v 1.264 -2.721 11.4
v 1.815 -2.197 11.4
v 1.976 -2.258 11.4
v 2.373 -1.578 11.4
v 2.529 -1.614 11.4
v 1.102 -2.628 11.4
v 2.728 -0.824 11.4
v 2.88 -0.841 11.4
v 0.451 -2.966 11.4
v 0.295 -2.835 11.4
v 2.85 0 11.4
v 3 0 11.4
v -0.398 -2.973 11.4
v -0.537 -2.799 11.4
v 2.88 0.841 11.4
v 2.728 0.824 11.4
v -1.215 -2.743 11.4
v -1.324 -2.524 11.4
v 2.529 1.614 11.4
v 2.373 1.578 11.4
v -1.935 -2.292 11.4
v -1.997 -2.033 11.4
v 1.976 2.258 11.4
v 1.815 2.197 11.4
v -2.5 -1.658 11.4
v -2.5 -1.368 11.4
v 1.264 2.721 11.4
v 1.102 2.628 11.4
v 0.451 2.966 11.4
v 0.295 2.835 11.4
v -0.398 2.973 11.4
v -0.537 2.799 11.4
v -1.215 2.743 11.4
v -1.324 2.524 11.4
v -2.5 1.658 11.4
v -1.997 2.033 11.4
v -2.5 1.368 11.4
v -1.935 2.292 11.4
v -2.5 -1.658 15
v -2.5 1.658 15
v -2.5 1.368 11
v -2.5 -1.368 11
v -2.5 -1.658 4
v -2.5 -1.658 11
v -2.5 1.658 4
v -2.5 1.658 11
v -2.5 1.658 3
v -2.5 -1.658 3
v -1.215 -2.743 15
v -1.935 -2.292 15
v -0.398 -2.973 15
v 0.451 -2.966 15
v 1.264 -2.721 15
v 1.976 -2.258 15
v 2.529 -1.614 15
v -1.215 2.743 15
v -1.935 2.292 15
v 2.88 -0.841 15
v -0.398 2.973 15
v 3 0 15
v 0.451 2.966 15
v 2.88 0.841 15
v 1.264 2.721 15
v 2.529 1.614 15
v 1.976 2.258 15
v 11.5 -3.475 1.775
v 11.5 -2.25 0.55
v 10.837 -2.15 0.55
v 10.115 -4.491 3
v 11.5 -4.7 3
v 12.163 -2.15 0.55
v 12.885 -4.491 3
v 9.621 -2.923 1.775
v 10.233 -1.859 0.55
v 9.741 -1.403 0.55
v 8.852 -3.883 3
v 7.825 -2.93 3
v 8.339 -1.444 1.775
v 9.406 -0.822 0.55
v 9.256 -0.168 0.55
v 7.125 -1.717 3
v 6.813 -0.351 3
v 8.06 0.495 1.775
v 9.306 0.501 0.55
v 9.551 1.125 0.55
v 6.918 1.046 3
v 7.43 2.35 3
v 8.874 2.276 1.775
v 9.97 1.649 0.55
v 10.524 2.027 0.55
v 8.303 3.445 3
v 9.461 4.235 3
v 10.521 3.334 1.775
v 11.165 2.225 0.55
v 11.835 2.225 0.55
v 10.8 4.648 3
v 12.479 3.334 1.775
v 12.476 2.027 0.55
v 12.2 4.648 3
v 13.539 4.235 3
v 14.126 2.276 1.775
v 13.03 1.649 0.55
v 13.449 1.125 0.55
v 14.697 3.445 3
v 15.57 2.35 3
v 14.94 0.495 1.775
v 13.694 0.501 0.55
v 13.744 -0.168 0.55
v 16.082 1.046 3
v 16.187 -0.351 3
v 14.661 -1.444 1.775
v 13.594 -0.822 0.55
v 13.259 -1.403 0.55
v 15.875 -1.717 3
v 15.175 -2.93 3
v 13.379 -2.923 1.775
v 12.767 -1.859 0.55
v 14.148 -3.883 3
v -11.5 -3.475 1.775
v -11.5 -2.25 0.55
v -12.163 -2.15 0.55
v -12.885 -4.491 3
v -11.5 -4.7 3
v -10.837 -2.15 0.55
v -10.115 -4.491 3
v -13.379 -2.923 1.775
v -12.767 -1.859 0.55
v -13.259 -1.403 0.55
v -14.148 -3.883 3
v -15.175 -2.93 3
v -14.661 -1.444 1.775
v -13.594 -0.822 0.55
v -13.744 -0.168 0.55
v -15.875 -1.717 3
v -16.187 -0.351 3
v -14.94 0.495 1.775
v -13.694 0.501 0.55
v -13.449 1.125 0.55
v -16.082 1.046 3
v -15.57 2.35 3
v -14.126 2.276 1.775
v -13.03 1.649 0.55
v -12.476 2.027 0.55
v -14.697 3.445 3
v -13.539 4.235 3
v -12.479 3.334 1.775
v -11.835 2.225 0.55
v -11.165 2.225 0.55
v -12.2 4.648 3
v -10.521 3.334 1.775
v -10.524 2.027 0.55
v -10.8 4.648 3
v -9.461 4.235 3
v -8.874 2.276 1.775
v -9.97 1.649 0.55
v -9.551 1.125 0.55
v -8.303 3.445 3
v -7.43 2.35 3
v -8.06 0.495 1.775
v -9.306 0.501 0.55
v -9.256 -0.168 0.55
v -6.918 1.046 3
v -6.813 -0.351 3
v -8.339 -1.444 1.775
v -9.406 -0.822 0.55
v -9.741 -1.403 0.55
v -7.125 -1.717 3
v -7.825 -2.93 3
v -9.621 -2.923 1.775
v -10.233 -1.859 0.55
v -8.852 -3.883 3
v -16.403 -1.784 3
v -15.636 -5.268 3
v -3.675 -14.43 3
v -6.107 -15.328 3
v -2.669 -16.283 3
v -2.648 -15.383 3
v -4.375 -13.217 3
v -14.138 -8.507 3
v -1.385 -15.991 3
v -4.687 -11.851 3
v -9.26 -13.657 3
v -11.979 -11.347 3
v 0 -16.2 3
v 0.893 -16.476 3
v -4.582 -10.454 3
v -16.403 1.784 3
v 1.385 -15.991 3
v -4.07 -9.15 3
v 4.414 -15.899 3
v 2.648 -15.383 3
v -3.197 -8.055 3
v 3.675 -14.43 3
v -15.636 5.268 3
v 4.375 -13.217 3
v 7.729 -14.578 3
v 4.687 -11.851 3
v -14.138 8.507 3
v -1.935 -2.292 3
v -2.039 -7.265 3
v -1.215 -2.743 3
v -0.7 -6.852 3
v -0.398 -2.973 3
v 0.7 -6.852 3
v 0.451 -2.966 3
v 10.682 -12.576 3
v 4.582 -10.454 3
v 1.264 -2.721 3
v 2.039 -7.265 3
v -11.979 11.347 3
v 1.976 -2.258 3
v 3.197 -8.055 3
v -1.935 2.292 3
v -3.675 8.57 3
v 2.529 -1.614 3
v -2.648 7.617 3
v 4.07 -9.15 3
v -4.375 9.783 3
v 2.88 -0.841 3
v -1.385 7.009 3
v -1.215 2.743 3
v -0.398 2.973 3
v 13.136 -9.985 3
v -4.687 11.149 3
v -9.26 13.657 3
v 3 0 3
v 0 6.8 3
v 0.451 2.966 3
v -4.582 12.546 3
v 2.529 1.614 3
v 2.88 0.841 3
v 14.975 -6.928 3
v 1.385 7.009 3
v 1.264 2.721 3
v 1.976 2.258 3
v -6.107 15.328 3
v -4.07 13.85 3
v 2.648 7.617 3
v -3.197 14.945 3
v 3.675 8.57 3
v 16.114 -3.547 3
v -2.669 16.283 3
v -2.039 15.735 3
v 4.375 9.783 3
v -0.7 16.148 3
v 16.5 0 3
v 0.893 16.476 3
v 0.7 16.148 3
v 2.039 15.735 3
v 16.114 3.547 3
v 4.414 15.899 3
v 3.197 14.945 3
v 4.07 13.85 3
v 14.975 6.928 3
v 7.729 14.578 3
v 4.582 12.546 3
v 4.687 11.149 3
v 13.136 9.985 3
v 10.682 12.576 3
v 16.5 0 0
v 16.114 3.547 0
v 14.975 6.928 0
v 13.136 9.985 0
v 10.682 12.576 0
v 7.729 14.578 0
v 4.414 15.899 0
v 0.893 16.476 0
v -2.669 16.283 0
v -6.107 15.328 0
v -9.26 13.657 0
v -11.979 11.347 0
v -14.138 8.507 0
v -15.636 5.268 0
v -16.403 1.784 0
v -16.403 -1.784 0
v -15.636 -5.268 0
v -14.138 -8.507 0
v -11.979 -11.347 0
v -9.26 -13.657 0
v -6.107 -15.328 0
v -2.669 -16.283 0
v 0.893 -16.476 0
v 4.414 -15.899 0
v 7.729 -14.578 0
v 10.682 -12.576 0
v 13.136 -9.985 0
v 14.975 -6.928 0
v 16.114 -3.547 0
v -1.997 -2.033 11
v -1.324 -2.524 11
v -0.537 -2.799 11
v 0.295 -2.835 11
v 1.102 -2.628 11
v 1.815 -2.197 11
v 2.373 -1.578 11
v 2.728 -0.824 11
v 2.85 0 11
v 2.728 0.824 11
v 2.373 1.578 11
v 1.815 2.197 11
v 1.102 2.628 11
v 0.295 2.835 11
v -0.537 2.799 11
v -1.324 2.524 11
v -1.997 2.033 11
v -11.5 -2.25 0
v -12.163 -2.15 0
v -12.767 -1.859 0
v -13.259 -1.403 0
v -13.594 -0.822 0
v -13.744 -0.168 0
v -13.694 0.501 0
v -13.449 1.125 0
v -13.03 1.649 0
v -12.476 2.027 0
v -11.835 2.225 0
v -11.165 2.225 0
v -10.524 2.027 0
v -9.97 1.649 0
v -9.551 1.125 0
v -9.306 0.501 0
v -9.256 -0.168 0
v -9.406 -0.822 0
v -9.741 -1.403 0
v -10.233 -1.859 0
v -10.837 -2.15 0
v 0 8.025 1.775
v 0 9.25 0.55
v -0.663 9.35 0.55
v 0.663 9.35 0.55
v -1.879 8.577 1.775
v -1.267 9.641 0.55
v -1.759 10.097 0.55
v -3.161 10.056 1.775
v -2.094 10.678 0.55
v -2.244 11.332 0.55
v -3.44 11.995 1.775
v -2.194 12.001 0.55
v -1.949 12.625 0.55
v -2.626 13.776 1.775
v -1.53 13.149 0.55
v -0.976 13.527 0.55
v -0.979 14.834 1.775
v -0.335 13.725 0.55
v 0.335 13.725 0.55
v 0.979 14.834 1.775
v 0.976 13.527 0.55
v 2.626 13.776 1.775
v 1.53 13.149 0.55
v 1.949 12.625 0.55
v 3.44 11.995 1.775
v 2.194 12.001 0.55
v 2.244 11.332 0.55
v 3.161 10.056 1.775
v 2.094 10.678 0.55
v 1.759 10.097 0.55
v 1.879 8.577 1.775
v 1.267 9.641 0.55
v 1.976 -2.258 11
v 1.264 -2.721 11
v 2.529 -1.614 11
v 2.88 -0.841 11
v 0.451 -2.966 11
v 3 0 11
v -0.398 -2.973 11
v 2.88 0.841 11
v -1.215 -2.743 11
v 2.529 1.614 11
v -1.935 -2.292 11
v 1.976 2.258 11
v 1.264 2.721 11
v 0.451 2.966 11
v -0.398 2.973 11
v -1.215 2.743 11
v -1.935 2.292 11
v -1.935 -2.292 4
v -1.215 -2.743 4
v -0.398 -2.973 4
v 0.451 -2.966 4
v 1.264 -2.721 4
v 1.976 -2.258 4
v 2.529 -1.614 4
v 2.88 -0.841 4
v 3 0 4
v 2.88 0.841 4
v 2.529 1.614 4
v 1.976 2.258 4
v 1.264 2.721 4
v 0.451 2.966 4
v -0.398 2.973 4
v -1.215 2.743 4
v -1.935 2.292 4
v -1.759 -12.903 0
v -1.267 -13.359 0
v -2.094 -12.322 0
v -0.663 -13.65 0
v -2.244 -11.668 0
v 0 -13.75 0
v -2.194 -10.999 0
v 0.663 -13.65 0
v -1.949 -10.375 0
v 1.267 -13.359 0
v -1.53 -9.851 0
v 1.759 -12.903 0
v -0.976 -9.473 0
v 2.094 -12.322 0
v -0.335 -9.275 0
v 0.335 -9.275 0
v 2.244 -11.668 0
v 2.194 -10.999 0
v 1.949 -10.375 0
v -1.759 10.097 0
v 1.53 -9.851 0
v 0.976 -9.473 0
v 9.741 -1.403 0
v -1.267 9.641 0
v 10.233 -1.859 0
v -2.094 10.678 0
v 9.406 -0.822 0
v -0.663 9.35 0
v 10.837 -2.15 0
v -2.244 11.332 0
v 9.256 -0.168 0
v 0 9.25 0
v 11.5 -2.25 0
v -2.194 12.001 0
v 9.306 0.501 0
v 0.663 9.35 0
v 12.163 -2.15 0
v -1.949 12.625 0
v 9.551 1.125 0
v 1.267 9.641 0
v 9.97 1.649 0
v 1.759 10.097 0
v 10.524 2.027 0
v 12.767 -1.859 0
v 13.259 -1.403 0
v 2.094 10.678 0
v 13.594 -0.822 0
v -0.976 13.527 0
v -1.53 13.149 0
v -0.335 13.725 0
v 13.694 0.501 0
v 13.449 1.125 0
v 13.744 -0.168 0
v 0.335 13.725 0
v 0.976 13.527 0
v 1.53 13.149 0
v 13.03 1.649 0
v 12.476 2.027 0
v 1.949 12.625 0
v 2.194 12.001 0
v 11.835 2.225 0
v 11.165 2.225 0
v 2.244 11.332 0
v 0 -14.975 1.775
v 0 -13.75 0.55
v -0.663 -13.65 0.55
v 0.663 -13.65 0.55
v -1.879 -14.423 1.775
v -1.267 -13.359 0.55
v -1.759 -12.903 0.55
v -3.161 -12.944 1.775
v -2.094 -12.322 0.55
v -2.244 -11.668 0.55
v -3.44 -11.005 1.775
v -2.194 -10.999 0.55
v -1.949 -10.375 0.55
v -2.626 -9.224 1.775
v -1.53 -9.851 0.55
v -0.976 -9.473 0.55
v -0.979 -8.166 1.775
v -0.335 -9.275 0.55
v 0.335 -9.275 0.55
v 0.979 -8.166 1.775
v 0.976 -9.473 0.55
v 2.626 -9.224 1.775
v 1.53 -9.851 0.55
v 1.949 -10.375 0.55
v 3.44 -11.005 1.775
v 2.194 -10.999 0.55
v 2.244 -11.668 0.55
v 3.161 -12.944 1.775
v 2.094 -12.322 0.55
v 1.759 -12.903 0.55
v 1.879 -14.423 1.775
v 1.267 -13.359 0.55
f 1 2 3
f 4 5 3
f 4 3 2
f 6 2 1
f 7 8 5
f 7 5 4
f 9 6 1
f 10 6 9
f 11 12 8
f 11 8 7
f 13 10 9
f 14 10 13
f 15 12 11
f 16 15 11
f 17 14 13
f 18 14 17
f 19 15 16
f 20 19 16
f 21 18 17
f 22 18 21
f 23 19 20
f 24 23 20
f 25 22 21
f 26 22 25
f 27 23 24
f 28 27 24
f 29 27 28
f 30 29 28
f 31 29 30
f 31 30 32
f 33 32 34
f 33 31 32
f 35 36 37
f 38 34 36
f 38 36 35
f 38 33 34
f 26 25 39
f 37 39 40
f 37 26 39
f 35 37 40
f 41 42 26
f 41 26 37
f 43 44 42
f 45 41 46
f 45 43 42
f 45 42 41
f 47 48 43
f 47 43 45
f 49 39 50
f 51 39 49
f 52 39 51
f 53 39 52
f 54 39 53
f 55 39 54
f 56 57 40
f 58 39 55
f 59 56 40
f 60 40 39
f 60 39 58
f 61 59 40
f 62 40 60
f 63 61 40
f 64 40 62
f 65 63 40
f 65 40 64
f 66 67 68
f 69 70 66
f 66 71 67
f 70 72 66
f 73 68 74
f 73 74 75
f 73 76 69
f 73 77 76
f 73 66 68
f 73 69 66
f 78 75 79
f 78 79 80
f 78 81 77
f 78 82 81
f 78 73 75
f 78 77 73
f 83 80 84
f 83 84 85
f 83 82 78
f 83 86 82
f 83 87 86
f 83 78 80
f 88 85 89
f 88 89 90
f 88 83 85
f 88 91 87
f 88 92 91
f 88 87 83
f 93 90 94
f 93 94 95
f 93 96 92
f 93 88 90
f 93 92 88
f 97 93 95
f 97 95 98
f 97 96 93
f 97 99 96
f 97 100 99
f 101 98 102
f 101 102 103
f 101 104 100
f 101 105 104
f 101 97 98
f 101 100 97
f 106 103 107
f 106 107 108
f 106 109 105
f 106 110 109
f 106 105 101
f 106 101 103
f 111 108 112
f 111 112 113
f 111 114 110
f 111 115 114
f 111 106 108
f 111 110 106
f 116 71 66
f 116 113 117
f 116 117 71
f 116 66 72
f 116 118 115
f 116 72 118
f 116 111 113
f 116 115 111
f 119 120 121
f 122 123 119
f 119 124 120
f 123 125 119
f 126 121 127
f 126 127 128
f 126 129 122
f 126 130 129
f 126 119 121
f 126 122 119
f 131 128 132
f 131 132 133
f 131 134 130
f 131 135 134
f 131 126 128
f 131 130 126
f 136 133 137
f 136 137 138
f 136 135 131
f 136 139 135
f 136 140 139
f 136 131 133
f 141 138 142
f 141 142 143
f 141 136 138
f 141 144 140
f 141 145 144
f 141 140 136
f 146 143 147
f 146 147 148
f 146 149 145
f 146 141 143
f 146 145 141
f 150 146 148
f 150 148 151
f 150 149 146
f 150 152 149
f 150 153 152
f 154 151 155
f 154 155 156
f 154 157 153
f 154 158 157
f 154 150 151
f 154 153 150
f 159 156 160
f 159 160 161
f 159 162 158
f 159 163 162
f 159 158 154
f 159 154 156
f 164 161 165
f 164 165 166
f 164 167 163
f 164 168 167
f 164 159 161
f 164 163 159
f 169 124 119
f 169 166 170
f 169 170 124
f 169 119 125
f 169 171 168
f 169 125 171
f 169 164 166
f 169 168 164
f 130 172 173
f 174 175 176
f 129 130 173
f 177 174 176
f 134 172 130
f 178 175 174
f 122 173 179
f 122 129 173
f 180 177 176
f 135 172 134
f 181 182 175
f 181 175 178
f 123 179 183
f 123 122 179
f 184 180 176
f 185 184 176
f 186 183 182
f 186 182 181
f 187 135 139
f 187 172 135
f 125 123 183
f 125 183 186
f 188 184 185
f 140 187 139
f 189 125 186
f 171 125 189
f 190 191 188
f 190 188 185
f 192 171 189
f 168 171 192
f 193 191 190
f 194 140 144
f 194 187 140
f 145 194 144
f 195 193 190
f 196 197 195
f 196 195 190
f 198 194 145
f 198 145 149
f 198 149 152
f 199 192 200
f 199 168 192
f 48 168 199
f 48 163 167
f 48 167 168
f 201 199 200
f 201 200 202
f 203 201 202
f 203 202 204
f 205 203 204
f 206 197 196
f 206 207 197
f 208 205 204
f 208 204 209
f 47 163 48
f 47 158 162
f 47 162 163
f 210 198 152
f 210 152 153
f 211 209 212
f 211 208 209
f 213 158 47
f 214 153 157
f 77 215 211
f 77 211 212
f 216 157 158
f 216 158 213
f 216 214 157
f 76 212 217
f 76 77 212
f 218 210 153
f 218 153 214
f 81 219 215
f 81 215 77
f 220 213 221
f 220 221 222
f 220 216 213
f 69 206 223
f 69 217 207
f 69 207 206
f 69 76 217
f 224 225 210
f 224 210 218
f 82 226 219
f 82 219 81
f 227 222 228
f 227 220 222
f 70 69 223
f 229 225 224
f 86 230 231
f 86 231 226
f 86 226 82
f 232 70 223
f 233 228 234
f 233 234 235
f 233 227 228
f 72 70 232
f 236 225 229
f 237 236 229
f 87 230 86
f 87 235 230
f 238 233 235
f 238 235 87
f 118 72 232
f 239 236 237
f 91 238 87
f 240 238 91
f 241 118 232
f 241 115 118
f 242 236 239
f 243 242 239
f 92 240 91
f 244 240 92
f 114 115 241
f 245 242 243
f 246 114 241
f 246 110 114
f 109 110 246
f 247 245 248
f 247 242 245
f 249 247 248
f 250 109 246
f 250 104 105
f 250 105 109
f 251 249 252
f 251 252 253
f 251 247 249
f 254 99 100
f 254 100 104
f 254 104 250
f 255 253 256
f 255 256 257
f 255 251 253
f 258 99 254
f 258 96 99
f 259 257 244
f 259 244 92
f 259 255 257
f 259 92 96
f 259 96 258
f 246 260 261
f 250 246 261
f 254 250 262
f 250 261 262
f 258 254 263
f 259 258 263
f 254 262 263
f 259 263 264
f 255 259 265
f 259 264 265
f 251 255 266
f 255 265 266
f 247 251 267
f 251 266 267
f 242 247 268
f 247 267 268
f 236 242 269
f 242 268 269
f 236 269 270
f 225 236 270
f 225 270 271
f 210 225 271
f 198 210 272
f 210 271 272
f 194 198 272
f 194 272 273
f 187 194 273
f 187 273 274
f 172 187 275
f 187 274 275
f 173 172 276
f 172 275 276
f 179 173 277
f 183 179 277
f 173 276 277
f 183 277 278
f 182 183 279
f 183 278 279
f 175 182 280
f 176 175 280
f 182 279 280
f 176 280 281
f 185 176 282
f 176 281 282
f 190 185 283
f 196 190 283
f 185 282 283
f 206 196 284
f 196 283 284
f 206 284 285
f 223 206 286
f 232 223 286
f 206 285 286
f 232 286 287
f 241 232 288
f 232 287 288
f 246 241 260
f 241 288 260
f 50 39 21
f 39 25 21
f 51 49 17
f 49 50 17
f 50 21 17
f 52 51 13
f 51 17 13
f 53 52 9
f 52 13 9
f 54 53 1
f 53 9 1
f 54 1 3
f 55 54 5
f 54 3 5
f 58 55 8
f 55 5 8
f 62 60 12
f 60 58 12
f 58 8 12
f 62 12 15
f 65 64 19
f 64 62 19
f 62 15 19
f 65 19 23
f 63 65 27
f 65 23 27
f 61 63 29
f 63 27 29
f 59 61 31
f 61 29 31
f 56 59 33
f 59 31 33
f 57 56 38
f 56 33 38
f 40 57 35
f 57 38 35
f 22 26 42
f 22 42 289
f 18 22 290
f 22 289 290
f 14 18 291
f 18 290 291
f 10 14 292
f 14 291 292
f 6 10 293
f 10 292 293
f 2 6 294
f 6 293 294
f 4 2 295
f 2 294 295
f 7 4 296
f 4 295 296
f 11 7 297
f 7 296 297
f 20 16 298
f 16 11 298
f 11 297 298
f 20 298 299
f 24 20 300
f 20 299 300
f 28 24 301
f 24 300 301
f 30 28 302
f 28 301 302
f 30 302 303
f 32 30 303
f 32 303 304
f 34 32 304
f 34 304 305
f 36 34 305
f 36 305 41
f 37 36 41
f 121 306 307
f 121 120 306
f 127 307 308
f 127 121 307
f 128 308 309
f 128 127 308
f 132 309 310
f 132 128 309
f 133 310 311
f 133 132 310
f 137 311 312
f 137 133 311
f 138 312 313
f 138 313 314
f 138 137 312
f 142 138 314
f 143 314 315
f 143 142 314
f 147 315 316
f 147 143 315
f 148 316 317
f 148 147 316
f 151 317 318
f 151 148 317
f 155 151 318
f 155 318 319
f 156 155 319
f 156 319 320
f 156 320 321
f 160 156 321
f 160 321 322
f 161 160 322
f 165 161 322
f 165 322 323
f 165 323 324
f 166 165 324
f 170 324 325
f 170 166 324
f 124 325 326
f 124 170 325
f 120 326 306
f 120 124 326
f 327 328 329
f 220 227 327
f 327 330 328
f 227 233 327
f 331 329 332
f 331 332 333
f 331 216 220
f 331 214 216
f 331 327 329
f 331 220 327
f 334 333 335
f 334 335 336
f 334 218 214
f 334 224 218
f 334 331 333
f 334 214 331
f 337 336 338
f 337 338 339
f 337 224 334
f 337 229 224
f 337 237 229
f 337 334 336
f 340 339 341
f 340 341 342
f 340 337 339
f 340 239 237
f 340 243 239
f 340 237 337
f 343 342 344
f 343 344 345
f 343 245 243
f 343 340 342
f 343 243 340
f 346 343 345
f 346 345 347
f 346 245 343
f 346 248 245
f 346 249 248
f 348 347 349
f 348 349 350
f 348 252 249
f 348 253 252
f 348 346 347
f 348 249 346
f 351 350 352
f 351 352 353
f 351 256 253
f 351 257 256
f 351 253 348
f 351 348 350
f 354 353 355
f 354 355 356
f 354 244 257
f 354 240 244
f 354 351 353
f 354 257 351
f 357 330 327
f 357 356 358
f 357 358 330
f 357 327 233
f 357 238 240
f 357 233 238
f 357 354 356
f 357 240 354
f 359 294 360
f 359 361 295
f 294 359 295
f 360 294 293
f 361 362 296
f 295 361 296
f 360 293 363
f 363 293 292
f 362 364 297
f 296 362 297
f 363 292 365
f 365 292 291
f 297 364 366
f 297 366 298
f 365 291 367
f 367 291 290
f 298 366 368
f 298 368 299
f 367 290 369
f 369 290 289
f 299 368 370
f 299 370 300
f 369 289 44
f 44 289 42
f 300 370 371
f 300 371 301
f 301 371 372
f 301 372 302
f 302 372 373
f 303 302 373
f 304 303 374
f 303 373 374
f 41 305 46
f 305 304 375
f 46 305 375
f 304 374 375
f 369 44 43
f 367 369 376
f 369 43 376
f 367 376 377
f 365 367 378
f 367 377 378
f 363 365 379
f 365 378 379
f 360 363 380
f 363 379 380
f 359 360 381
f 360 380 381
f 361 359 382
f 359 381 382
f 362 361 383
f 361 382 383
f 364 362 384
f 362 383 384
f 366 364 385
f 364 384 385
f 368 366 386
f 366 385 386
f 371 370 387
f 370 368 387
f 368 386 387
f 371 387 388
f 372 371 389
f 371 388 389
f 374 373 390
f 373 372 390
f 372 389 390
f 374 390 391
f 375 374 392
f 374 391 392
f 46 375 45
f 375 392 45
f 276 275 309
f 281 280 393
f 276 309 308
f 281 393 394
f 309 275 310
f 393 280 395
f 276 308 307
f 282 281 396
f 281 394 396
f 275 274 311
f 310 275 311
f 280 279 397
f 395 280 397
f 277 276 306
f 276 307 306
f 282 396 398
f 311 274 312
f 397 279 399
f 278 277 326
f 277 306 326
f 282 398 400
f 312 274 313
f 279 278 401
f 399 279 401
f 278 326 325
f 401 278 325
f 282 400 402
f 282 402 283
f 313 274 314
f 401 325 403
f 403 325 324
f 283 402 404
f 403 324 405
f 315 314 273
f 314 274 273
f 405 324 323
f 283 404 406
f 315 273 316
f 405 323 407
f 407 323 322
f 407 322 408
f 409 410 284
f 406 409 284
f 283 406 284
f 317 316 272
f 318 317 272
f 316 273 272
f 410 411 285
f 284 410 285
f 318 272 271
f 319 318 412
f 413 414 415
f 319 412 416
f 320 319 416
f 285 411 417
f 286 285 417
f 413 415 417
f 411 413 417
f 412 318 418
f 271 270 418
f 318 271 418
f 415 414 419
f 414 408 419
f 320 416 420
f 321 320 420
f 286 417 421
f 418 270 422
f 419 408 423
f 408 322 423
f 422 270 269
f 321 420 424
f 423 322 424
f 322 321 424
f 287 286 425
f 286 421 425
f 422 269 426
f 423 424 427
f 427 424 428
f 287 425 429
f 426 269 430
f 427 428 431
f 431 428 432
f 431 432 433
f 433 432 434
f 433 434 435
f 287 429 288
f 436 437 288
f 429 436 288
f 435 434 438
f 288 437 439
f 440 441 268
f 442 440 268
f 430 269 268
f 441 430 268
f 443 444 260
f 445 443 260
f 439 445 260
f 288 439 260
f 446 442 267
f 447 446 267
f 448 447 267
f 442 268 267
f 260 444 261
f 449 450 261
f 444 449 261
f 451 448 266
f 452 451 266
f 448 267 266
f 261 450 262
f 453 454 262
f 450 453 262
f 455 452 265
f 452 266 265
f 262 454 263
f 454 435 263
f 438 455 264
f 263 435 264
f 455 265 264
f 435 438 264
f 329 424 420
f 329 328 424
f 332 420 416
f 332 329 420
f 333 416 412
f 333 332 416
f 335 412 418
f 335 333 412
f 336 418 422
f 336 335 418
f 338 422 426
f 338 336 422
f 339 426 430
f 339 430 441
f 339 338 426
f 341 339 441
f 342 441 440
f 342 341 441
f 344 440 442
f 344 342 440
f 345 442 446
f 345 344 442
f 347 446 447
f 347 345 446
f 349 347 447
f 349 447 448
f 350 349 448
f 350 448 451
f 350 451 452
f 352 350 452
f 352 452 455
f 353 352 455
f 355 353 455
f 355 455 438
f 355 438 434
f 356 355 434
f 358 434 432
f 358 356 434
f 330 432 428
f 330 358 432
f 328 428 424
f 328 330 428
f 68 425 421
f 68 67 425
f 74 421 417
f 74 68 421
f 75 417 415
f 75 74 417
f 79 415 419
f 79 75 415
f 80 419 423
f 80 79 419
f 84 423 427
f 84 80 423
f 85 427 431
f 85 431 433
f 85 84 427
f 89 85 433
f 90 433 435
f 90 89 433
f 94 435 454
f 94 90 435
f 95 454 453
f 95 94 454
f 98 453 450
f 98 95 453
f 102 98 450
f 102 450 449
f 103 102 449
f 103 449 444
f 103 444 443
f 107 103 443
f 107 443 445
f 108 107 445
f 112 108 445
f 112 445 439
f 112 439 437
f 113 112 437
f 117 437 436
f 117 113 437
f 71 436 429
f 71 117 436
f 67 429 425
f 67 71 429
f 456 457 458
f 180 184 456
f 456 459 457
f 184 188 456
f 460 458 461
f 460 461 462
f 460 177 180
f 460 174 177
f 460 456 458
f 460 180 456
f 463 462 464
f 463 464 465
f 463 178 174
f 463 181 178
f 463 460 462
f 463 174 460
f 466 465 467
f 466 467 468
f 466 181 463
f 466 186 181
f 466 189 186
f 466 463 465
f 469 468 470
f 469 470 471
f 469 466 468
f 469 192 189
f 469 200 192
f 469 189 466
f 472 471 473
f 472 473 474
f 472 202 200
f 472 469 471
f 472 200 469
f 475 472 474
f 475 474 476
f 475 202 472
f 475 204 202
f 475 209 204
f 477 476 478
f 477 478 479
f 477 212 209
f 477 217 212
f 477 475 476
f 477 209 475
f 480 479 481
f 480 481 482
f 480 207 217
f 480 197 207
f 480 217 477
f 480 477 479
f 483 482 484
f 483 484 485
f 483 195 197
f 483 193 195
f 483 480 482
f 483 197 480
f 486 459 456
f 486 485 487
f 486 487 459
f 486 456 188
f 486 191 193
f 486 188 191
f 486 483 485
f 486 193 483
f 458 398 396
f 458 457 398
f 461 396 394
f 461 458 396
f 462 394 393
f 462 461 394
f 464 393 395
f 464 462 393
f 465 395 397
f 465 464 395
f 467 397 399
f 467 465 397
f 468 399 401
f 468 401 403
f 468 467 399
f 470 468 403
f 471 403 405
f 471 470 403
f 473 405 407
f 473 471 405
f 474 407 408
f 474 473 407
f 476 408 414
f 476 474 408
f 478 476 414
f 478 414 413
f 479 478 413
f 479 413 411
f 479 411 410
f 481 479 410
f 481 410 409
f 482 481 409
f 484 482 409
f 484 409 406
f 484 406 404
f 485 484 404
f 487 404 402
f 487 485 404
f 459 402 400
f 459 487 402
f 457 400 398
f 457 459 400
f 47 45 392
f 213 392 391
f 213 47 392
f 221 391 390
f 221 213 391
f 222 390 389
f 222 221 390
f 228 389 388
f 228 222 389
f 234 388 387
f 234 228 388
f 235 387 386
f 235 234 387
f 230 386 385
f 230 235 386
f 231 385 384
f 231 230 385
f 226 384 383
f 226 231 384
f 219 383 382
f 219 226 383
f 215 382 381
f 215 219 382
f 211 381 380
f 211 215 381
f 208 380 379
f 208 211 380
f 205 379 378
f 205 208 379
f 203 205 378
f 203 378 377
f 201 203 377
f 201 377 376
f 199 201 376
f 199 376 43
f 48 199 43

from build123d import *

# Parameters (mm, degrees)
SKETCH1_R                                      = 16.5
BOSS_EXTRUDE1_DEPTH                            = 3
SKETCH2_R                                      = 3
BOSS_EXTRUDE2_DEPTH                            = 12
SKETCH3_R                                      = 6
BOSS_EXTRUDE3_DEPTH                            = 1
CUT_EXTRUDE1_START                             = -11
CUT_EXTRUDE1_DEPTH                             = 11
SKETCH5_R                                      = 2
CUT_EXTRUDE2_DEPTH                             = 27.239283527
CIRPATTERN1_COUNT                              = 4
CSK_FOR_M4_FLAT_HEAD_MACHINE_SCREW1_AT_2_COUNT = 2
CSK_FOR_M4_FLAT_HEAD_MACHINE_SCREW1_AT_2_PITCH = 16.263455967
CSK_FOR_M4_FLAT_HEAD_MACHINE_SCREW1_AT_3_COUNT = 2
CSK_FOR_M4_FLAT_HEAD_MACHINE_SCREW1_AT_3_PITCH = 23
CSK_FOR_M4_FLAT_HEAD_MACHINE_SCREW1_AT_4_COUNT = 2
CSK_FOR_M4_FLAT_HEAD_MACHINE_SCREW1_AT_4_PITCH = 16.263455967
CUT_EXTRUDE3_START                             = -1
SKETCH9_R                                      = 6
CUT_EXTRUDE3_DEPTH                             = 1
SKETCH10_W                                     = 0.3
SKETCH10_H                                     = 0.4


with BuildPart() as part:
    # Sketch1 → Boss-Extrude1 (new body)
    with BuildSketch(Plane.XY):
        Circle(SKETCH1_R)
    extrude(amount=BOSS_EXTRUDE1_DEPTH)

    # Sketch2 → Boss-Extrude2 (add)
    with BuildSketch(Plane.XY.offset(3)):
        Circle(SKETCH2_R)
    extrude(amount=BOSS_EXTRUDE2_DEPTH)

    # Sketch3 → Boss-Extrude3 (add)
    with BuildSketch(Plane.XY.offset(3)):
        Circle(SKETCH3_R)
    extrude(amount=BOSS_EXTRUDE3_DEPTH)

    # Sketch4 → Cut-Extrude1 (cut)
    with BuildSketch(Plane.XY.offset(15).offset(CUT_EXTRUDE1_START)):
        with BuildLine():
            Line((-2.5, -1.658312395), (-2.5, 1.658312395))
            ThreePointArc((-2.5, 1.658312395), (-3, 0), (-2.5, -1.658312395))
        make_face()
    extrude(amount=CUT_EXTRUDE1_DEPTH, mode=Mode.SUBTRACT)

    # Sketch5 → Cut-Extrude2 (cut, through all)
    with BuildSketch(Plane.XY.offset(3)):
        with Locations((0, 11.5)):
            Circle(SKETCH5_R)
    cut_extrude2 = extrude(amount=-CUT_EXTRUDE2_DEPTH, mode=Mode.SUBTRACT)

    # CirPattern1: Cut-Extrude2 ×4 about axis
    cirpattern1_axis = Axis((0, 0, 0), (0, 0, 1))
    for i in range(1, CIRPATTERN1_COUNT):
        add(cut_extrude2.rotate(cirpattern1_axis, i * 360 / CIRPATTERN1_COUNT), mode=Mode.SUBTRACT)

    # Sketch8 → CSK for M4 Flat Head Machine Screw1 (revolve, cut)
    with BuildSketch(Plane(origin=(-11.5, 0, 3), x_dir=(0, -1, 0), z_dir=(1, 0, 0))):
        Polygon((0, 0), (0, 3), (2.25, 3), (2.25, 2.45), (4.7, 0), align=None)
    csk_for_m4_flat_head_machine_screw1 = revolve(axis=Axis((-11.5, 0, 9.35), (0, 0, -1)), mode=Mode.SUBTRACT)

    # CSK for M4 Flat Head Machine Screw1 at 2: CSK for M4 Flat Head Machine Screw1 ×2
    with Locations(*[Vector(0.7071067811865462, 0.7071067811865488, 0) * (i * CSK_FOR_M4_FLAT_HEAD_MACHINE_SCREW1_AT_2_PITCH) for i in range(1, CSK_FOR_M4_FLAT_HEAD_MACHINE_SCREW1_AT_2_COUNT)]):
        add(csk_for_m4_flat_head_machine_screw1, mode=Mode.SUBTRACT)

    # CSK for M4 Flat Head Machine Screw1 at 3: CSK for M4 Flat Head Machine Screw1 ×2
    with Locations(*[(i * CSK_FOR_M4_FLAT_HEAD_MACHINE_SCREW1_AT_3_PITCH, 0, 0) for i in range(1, CSK_FOR_M4_FLAT_HEAD_MACHINE_SCREW1_AT_3_COUNT)]):
        add(csk_for_m4_flat_head_machine_screw1, mode=Mode.SUBTRACT)

    # CSK for M4 Flat Head Machine Screw1 at 4: CSK for M4 Flat Head Machine Screw1 ×2
    with Locations(*[Vector(0.7071067811865488, -0.7071067811865462, 0) * (i * CSK_FOR_M4_FLAT_HEAD_MACHINE_SCREW1_AT_4_PITCH) for i in range(1, CSK_FOR_M4_FLAT_HEAD_MACHINE_SCREW1_AT_4_COUNT)]):
        add(csk_for_m4_flat_head_machine_screw1, mode=Mode.SUBTRACT)

    # Sketch9 → Cut-Extrude3 (cut)
    with BuildSketch(Plane.XY.offset(4).offset(CUT_EXTRUDE3_START)):
        Circle(SKETCH9_R)
        with BuildLine():
            Line((-2.5, -1.658312395), (-2.5, 1.658312395))
            ThreePointArc((-2.5, 1.658312395), (3, 0), (-2.5, -1.658312395))
        make_face(mode=Mode.SUBTRACT)
    extrude(amount=CUT_EXTRUDE3_DEPTH, mode=Mode.SUBTRACT)

    # Sketch10 → Cut-Revolve1 (revolve, cut)
    with BuildSketch(Plane(origin=(0, 0, 0), x_dir=(1, 0, 0), z_dir=(0, 1, 0))):
        with Locations((3, -11.2)):
            Rectangle(SKETCH10_W, SKETCH10_H)
    revolve(axis=Axis((0, 0, 0), (0, 0, 1)), mode=Mode.SUBTRACT)


solid = part.part
